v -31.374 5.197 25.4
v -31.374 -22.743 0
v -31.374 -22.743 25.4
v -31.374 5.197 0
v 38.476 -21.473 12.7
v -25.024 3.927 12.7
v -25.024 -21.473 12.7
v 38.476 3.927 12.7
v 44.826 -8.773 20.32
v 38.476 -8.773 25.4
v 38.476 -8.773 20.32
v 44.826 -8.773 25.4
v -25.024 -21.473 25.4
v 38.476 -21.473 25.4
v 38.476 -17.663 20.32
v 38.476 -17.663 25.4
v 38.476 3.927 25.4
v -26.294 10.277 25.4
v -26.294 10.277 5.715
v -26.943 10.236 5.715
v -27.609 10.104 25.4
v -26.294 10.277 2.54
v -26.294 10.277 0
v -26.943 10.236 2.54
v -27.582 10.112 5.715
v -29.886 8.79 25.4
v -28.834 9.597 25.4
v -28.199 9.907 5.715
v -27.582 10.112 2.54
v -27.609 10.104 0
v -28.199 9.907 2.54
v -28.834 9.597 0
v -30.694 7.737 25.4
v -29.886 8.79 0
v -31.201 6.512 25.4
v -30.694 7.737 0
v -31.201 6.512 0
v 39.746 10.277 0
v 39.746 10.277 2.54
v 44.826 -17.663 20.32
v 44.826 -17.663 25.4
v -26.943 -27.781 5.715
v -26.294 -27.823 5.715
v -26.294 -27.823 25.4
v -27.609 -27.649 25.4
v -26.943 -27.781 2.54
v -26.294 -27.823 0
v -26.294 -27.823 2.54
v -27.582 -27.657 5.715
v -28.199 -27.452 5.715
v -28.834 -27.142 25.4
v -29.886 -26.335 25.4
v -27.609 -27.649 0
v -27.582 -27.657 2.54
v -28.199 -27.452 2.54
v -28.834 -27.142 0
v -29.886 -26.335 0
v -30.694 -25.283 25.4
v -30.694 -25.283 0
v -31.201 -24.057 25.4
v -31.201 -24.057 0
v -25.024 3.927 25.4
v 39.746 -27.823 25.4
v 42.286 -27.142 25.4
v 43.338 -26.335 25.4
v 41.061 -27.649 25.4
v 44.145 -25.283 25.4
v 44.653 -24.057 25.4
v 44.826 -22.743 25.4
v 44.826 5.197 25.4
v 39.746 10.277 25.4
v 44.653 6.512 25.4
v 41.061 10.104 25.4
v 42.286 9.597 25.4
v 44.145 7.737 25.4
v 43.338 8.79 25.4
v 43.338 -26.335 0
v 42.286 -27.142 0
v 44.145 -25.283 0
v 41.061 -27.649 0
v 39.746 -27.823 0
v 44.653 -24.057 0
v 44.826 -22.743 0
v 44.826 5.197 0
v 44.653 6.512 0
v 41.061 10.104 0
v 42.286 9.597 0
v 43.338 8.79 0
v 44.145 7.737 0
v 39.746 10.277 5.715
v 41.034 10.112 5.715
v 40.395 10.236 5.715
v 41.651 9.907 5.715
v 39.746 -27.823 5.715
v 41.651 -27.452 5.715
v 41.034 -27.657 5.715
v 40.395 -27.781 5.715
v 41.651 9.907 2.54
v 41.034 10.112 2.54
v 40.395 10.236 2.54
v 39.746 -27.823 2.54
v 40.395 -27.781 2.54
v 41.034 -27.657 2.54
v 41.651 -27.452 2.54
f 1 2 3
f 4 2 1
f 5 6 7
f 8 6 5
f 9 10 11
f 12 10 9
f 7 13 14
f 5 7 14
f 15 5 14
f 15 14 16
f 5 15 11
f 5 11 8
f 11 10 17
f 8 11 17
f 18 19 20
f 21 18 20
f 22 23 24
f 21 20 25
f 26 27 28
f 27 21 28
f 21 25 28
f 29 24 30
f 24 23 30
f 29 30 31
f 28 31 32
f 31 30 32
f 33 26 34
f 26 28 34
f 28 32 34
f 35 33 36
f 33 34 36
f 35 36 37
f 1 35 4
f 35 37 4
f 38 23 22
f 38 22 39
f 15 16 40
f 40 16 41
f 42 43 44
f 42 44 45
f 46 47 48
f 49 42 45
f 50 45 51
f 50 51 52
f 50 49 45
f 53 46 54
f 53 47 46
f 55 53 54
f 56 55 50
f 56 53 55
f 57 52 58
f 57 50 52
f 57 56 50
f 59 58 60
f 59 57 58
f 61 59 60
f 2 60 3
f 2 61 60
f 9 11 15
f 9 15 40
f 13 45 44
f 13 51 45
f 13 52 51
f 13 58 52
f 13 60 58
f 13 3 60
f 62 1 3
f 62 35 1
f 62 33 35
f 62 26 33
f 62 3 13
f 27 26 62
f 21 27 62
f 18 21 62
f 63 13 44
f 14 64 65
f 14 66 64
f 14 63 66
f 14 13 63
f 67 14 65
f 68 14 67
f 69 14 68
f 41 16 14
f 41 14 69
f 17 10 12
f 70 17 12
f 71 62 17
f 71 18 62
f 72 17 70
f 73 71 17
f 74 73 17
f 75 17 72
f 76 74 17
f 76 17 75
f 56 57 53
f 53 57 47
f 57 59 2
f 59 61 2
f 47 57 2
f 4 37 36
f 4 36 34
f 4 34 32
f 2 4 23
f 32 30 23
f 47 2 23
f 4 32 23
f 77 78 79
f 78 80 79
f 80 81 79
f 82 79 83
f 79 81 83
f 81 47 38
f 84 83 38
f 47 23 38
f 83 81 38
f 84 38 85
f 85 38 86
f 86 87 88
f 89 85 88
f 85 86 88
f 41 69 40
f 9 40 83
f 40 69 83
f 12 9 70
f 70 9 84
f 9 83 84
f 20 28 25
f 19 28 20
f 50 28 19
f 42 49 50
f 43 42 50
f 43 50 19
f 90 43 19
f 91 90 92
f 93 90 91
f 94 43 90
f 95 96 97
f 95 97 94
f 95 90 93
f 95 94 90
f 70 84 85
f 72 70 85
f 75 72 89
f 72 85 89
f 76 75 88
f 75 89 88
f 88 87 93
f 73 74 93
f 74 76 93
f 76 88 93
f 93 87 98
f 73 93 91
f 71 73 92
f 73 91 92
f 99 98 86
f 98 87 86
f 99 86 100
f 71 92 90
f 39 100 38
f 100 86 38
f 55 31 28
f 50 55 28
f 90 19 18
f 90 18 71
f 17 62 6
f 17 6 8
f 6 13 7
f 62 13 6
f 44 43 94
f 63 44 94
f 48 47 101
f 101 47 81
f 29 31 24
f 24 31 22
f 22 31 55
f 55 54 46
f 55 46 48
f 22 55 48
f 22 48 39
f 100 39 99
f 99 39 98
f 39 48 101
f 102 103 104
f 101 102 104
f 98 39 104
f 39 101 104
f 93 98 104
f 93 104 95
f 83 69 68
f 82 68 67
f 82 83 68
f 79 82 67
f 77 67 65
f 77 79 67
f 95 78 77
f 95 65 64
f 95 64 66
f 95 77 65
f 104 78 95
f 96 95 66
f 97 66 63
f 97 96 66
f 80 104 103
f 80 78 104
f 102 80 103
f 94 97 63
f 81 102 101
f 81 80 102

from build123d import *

# Parameters (mm, degrees)
F0_W        = 76.2
F0_H        = 38.1
F1_DEPTH    = 25.4
F2_W        = 69.85
F2_H        = 3.175
F3_DEPTH    = 38.101
F4_W        = 63.5
F4_H        = 25.4
F5_DEPTH    = 12.7
F6_W        = 6.35
F6_H        = 8.89
F7_DEPTH    = 5.08
F8_T1_DEPTH = 50.8


# Not quite as in the source:
# - a fillet or chamfer that OpenCascade refuses, or shapes differently, is made with other operations: its cross-section is extruded or revolved along the edge and cut away or added


with BuildPart() as f1:
    # F0 (on Top) → F1 (new body)
    with BuildSketch(Plane.XY):
        with Locations((6.725884974, -8.772585205)):
            Rectangle(F0_W, F0_H)
    extrude(amount=F1_DEPTH)

    # F2 (on face) → F3 (cut, through all)
    with BuildSketch(Plane.XZ.offset(27.822585205)):
        with Locations((6.725884974, 4.1275)):
            Rectangle(F2_W, F2_H)
    extrude(amount=-F3_DEPTH, mode=Mode.SUBTRACT)

    # F4 (on face) → F5 (cut)
    with BuildSketch(Plane.XY.offset(25.4)):
        with Locations((6.725884974, -8.772585205)):
            Rectangle(F4_W, F4_H)
    extrude(amount=-F5_DEPTH, mode=Mode.SUBTRACT)

    # F6 (on face) → F7 (cut)
    with BuildSketch(Plane.XY.offset(25.4)):
        with Locations((41.650884974, -13.217585205)):
            Rectangle(F6_W, F6_H)
    extrude(amount=-F7_DEPTH, mode=Mode.SUBTRACT)

    # F8: fillet of radius 5.08 on 4 edges, made by hand

    # F8_s2 → F8_t1 (cut)
    with BuildSketch(Plane.XY.offset(-12.7)):
        with BuildLine():
            ThreePointArc((44.825884974, 5.197414795), (43.3379874224, 8.7895172434), (39.745884974, 10.277414795))
            Line((39.745884974, 10.277414795), (44.825884974, 10.277414795))
            Line((44.825884974, 10.277414795), (44.825884974, 5.197414795))
        make_face()
        with BuildLine():
            ThreePointArc((-26.294115026, 10.277414795), (-29.8862174744, 8.7895172434), (-31.374115026, 5.197414795))
            Line((-31.374115026, 5.197414795), (-31.374115026, 10.277414795))
            Line((-31.374115026, 10.277414795), (-26.294115026, 10.277414795))
        make_face()
        with BuildLine():
            ThreePointArc((44.825884974, -22.742585205), (43.3379874224, -26.3346876534), (39.745884974, -27.822585205))
            Line((39.745884974, -27.822585205), (44.825884974, -27.822585205))
            Line((44.825884974, -27.822585205), (44.825884974, -22.742585205))
        make_face()
        with BuildLine():
            ThreePointArc((-26.294115026, -27.822585205), (-29.8862174744, -26.3346876534), (-31.374115026, -22.742585205))
            Line((-31.374115026, -22.742585205), (-31.374115026, -27.822585205))
            Line((-31.374115026, -27.822585205), (-26.294115026, -27.822585205))
        make_face()
    extrude(amount=F8_T1_DEPTH, mode=Mode.SUBTRACT)


solid = f1.part
